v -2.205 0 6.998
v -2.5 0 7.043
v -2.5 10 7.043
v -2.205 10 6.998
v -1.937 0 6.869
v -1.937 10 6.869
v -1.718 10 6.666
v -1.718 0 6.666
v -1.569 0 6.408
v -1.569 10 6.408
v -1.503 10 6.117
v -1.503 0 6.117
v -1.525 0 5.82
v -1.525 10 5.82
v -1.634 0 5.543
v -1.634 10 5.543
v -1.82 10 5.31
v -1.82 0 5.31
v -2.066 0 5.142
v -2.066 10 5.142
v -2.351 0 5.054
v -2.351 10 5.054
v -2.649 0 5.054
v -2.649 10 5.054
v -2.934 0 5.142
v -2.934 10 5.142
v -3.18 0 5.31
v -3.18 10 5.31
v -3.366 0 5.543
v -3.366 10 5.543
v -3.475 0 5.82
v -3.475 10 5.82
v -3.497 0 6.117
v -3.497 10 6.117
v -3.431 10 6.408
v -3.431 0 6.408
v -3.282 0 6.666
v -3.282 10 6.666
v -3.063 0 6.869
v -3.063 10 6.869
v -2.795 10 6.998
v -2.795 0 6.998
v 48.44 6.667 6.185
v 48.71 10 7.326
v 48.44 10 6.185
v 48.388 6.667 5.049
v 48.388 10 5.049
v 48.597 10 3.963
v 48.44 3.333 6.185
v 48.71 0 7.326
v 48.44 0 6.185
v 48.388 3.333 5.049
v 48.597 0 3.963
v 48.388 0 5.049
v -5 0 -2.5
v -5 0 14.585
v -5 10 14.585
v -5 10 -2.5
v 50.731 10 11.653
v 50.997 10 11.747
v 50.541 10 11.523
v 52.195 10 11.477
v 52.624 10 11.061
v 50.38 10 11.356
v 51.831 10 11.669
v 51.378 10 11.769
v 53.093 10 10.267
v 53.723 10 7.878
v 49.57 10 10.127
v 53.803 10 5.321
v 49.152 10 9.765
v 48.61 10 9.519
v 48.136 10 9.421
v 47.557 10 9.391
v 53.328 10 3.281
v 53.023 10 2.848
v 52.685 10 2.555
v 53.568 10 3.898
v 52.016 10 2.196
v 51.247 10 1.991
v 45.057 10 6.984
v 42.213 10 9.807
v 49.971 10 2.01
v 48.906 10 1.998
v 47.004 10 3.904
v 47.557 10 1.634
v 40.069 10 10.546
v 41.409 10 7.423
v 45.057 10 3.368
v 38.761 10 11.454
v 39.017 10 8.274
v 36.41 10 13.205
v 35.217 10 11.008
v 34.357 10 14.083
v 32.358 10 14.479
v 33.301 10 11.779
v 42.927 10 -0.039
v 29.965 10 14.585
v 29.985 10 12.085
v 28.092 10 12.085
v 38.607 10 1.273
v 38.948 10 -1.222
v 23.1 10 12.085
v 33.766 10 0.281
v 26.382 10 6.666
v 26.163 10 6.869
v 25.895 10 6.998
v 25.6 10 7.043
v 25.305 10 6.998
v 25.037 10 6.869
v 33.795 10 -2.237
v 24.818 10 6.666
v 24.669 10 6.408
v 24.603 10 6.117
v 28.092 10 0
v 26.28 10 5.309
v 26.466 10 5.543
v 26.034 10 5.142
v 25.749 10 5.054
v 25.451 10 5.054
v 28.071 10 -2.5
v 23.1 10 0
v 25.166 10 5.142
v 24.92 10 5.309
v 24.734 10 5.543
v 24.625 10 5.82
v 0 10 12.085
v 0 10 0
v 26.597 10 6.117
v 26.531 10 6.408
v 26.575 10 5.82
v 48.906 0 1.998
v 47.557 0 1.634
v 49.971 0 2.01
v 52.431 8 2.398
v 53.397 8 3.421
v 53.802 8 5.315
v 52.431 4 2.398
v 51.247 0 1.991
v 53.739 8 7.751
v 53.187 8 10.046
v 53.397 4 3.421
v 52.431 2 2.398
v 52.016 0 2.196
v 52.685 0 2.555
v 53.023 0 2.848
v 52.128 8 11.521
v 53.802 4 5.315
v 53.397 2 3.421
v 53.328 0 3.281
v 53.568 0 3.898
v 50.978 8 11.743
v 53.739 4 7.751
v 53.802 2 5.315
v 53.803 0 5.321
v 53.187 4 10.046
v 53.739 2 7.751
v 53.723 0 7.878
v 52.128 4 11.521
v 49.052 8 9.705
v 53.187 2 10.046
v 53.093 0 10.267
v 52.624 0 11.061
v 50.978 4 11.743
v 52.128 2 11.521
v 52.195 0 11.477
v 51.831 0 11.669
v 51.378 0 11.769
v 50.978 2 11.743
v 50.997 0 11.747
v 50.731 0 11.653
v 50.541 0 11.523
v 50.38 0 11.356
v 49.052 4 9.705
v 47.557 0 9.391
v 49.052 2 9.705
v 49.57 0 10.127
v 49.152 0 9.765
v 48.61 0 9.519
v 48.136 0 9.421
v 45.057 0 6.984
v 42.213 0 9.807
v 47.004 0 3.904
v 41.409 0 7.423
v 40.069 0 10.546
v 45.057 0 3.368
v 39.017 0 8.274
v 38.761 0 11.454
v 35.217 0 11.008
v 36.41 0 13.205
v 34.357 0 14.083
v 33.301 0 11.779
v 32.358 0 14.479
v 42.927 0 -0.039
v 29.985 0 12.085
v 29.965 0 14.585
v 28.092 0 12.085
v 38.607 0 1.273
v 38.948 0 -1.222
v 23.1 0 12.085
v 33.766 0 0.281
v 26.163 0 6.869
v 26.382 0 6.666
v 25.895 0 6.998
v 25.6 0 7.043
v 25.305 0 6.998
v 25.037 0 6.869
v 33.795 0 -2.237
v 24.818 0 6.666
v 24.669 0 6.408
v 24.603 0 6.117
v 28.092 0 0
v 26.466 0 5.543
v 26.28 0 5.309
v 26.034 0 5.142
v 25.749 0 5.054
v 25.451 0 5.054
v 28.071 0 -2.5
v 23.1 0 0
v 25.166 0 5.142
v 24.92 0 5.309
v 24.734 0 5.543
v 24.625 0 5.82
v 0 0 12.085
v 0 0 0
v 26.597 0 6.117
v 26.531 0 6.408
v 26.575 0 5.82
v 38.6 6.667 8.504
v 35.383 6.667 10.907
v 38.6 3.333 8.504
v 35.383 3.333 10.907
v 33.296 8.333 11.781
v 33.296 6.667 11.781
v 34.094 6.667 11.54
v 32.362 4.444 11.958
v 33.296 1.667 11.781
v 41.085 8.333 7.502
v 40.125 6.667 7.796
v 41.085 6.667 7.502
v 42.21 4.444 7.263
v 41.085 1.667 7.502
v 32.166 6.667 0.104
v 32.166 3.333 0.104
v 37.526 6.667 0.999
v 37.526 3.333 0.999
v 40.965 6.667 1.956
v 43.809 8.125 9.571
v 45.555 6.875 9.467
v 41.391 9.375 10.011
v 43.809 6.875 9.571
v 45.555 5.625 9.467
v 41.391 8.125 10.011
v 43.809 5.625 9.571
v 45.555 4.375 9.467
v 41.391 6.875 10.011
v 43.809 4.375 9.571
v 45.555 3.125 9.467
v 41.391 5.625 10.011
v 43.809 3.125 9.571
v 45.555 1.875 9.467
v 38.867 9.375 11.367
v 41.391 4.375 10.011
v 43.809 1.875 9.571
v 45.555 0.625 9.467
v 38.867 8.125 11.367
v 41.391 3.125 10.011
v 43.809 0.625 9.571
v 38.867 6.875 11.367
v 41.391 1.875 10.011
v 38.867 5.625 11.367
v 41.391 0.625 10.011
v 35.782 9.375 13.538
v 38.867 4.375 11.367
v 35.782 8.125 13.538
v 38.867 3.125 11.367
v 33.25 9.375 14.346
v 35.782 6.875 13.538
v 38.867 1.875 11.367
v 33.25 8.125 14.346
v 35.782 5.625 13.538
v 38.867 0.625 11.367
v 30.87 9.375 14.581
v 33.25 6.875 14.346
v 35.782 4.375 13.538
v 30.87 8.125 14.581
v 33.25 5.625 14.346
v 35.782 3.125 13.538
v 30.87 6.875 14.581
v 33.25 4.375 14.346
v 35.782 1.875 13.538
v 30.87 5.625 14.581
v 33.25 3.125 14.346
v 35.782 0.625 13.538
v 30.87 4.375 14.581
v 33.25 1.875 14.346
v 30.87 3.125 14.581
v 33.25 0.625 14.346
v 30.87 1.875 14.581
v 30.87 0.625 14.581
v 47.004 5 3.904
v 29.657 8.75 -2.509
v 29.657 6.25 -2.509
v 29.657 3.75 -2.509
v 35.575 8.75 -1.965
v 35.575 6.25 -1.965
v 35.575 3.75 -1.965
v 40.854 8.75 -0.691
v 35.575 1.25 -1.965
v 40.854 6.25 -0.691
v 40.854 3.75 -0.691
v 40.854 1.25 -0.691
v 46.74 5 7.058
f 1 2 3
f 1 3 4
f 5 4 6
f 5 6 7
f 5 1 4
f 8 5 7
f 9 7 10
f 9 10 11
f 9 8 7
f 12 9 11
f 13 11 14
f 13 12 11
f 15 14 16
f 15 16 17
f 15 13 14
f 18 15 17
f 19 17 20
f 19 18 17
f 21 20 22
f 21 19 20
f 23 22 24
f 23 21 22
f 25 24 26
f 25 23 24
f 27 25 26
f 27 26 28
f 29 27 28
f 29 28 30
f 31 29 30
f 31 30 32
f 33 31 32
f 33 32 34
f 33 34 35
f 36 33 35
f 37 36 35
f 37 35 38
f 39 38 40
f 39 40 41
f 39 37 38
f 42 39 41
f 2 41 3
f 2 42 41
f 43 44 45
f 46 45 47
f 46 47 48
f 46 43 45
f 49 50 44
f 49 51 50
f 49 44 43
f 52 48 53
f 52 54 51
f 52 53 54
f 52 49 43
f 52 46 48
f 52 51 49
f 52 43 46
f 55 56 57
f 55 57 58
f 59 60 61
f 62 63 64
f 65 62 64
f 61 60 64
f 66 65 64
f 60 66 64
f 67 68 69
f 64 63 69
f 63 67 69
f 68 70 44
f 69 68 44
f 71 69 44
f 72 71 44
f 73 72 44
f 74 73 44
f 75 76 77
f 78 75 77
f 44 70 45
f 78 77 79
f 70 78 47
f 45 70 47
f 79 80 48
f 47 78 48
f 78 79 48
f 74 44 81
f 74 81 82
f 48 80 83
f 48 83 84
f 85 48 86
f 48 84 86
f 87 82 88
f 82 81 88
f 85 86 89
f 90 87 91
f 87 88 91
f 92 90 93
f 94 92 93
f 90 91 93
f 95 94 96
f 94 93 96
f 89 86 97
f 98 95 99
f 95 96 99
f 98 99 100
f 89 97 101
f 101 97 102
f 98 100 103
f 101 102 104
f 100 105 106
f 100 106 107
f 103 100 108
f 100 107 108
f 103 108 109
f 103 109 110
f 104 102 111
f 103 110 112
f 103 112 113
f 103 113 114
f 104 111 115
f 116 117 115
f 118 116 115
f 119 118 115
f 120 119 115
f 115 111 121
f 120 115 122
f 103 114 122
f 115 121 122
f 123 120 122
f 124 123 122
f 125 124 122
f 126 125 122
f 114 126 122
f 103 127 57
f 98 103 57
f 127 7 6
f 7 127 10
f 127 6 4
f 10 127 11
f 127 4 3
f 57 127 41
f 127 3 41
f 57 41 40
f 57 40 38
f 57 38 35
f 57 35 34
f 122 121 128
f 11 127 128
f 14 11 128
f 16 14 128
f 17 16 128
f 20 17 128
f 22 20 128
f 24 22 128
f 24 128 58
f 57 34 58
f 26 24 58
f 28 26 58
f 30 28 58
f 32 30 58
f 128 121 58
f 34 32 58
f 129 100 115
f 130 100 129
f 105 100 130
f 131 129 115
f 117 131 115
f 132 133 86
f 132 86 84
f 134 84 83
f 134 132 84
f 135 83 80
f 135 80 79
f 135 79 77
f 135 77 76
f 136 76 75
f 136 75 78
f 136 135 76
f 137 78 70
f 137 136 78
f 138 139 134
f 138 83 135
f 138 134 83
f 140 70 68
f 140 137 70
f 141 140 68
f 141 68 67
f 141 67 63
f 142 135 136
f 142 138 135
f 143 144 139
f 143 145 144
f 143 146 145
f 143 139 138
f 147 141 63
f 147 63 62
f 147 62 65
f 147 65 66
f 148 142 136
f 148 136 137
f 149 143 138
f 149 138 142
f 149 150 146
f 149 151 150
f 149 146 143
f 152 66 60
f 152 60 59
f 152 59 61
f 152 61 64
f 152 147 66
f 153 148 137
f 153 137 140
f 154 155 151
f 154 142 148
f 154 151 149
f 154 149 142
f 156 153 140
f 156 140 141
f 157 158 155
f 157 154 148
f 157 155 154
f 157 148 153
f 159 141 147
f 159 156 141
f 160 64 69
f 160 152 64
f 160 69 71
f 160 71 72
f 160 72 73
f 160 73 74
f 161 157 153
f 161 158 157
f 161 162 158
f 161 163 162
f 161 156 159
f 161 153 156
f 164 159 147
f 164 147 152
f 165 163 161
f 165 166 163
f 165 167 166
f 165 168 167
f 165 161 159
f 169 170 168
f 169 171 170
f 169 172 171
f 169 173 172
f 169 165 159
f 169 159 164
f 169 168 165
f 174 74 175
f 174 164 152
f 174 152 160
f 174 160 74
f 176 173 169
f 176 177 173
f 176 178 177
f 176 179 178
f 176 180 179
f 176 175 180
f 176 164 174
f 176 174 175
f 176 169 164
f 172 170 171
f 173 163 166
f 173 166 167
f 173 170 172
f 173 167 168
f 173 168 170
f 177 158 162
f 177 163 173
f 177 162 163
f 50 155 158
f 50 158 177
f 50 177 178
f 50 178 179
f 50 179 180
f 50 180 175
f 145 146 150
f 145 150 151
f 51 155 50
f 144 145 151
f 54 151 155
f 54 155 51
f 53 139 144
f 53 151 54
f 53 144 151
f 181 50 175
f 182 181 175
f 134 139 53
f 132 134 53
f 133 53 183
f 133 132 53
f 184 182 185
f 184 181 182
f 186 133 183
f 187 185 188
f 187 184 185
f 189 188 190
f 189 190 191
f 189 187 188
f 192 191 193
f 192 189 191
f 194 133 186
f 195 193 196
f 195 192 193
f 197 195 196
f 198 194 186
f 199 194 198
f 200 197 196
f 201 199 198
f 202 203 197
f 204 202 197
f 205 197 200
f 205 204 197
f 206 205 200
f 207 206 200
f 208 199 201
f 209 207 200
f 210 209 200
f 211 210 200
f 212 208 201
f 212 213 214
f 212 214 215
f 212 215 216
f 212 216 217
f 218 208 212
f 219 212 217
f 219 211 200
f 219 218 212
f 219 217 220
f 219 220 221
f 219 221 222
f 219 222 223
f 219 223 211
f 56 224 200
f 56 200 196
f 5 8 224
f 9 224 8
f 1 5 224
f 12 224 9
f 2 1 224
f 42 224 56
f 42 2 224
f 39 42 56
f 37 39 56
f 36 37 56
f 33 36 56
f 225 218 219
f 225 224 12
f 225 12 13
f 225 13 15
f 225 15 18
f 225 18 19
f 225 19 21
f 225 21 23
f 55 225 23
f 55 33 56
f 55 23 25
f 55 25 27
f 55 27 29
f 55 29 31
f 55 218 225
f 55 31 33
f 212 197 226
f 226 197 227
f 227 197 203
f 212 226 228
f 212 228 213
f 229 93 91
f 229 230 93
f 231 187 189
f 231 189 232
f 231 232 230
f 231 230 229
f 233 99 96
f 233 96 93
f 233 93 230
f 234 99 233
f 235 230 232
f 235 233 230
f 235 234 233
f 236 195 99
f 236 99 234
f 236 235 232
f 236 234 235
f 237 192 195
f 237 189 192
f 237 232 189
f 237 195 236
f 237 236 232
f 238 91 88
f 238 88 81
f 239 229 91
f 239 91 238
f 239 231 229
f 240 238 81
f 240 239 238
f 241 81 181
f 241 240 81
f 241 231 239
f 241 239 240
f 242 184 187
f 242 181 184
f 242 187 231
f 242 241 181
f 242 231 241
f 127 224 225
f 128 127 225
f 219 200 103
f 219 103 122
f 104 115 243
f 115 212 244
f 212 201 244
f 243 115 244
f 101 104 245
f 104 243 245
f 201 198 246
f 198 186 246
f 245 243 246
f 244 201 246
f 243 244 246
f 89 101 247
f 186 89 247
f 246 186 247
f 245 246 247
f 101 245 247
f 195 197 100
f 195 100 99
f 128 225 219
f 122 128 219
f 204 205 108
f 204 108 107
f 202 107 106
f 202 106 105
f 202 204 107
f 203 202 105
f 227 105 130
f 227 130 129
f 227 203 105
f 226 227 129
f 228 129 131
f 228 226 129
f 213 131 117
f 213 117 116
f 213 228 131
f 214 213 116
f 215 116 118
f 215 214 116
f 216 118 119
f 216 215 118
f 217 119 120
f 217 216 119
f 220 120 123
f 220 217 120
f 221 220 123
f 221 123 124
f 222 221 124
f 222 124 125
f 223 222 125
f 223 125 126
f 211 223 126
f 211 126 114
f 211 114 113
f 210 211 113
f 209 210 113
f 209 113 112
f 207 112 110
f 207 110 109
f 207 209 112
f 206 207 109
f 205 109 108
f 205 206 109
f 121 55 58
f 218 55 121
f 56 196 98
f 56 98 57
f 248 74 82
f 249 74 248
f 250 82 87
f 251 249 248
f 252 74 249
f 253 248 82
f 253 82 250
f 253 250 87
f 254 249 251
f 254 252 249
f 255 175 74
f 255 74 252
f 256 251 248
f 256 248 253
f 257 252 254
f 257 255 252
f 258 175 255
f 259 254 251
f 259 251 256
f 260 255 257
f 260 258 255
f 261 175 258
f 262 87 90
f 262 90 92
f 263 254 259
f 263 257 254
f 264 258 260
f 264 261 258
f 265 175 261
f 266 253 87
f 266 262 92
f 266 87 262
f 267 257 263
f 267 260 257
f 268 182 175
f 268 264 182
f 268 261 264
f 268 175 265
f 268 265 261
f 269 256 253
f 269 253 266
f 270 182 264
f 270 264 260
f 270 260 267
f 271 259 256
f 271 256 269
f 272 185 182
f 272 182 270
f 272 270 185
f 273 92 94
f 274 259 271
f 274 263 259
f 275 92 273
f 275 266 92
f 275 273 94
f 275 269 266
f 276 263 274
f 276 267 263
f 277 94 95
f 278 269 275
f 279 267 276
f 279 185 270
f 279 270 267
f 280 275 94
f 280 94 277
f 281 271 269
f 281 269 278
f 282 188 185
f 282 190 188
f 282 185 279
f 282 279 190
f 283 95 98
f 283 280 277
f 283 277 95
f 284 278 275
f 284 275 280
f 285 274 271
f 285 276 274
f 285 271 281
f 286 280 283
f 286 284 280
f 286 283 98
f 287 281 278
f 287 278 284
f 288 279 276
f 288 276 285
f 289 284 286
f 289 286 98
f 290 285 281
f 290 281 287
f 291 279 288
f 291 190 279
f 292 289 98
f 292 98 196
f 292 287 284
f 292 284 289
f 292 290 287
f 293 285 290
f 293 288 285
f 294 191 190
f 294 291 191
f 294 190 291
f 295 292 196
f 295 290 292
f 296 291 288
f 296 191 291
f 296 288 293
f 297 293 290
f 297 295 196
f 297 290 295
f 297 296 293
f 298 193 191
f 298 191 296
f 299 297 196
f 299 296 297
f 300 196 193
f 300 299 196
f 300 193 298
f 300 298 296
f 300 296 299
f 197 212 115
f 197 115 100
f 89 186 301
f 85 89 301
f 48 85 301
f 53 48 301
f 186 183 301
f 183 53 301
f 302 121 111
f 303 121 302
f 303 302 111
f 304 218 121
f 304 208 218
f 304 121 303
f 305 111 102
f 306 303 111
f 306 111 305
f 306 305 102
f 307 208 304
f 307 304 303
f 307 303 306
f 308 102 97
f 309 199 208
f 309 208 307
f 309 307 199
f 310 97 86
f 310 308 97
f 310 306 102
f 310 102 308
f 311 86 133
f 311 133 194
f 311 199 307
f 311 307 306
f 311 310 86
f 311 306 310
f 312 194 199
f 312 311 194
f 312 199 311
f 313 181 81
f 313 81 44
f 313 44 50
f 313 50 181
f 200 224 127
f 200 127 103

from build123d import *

# Parameters (mm, degrees)
SKETCH_1_R      = 1
SKETCH_1_W      = 23.1
SKETCH_1_H      = 12.085165135
EXTRUDE_1_DEPTH = 10


with BuildPart() as part:
    # Эскиз1 → Бобышка-Вытянуть1 (new body)
    with BuildSketch(Plane(origin=(0, 0, 0), x_dir=(1, 0, 0), z_dir=(0, 1, 0))):
        with BuildLine():
            Line((-2.5, 2.5), (28.070995288, 2.5))
            add(Edge.make_bspline(
                [(28.070995288, 2.5), (28.32887344, 2.504318085), (28.835562657, 2.511245965), (29.921866616, 2.512119229), (31.964225284, 2.457517191), (34.707115979, 2.168731474), (37.997362638, 1.485873867), (40.79387565, 0.734966307), (43.953396938, -0.279779406), (46.385663882, -1.195748574), (47.557228164, -1.634125111)],
                knots=[0.143669129, 0.143669129, 0.143669129, 0.143669129, 0.200446635, 0.257224141, 0.370779153, 0.597889176, 0.711444188, 0.824999199, 0.938554211, 1.052109223, 1.052109223, 1.052109223, 1.052109223], degree=3))
            add(Edge.make_bspline(
                [(47.557228164, -1.634125111), (49.83999595, -2.578486337), (50.790555246, -1.175830705), (54.350201844, -3.715245794), (53.810633179, -11.510937101), (49.614910749, -12.021962191), (50.244612096, -9.357273045), (47.557228164, -9.390885833)],
                knots=[0, 0, 0, 0, 0.410599119, 0.487696402, 0.739497672, 0.793875548, 1, 1, 1, 1], degree=3))
            add(Edge.make_bspline(
                [(47.557228164, -9.390885833), (47.223512443, -9.403598686), (46.55537249, -9.42886967), (45.723740105, -9.461231999), (45.050994829, -9.485497305), (44.475367741, -9.514158988), (43.520556703, -9.588873607), (42.395821116, -9.749897974), (40.99972022, -10.09133704), (39.888015817, -10.595512334), (38.900584218, -11.310794918), (37.710783689, -12.364152312), (36.207778756, -13.39563326), (34.630627358, -14.030201283), (33.281126924, -14.37048255), (32.003062284, -14.531692535), (30.884799393, -14.587163413), (30.266883356, -14.58983575), (29.965322631, -14.585165135)],
                knots=[0.000757075, 0.000757075, 0.000757075, 0.000757075, 0.034517651, 0.068278226, 0.085158513, 0.102038801, 0.135799376, 0.203320526, 0.270841676, 0.405883976, 0.540926277, 0.675968577, 0.811010877, 0.878532027, 0.946053178, 1.013574328, 1.047334903, 1.081095478, 1.081095478, 1.081095478, 1.081095478], degree=3))
            Line((29.965322631, -14.585165135), (-2.5, -14.585165135))
            Line((-2.5, -14.585165135), (-5, -14.585165135))
            Line((-5, -14.585165135), (-5, 2.5))
            Line((-5, 2.5), (-2.5, 2.5))
        make_face()
        with Locations(Location((-2.5, -6.042582568, 0), (0, 0, 270))):
            Circle(SKETCH_1_R, mode=Mode.SUBTRACT)
        with Locations(Location((25.600001017, -6.042548927, 0), (0, 0, 270))):
            Circle(SKETCH_1_R, mode=Mode.SUBTRACT)
        with Locations((11.55, -6.042582568)):
            Rectangle(SKETCH_1_W, SKETCH_1_H, mode=Mode.SUBTRACT)
        with BuildLine():
            Line((28.092032276, -12.085165135), (29.985216163, -12.085165135))
            add(Edge.make_bspline(
                [(29.985216163, -12.085165135), (38.281074708, -12.220944361), (35.172452203, -7.360868715), (45.057228164, -6.984309607)],
                knots=[0, 0, 0, 0, 1, 1, 1, 1], degree=3))
            add(Edge.make_bspline(
                [(45.057228164, -6.984309607), (46.59616868, -6.960661023), (48.710327015, -7.325766452)],
                knots=[0, 0, 0, 1, 1, 1], degree=2))
            add(Edge.make_bspline(
                [(48.710327015, -7.325766452), (48.345253613, -6.197571714), (48.243086622, -5.009541806), (48.597312625, -3.963116498)],
                knots=[0, 0, 0, 0, 1, 1, 1, 1], degree=3))
            add(Edge.make_bspline(
                [(45.057228164, -3.367956317), (47.181075152, -4.141830426), (48.597312625, -3.963116498)],
                knots=[0, 0, 0, 1, 1, 1], degree=2))
            add(Edge.make_bspline(
                [(28.092032276, 0), (31.819034224, 0.063049174), (36.14539206, -0.033320809), (45.057228164, -3.367956317)],
                knots=[0.142072164, 0.142072164, 0.142072164, 0.142072164, 1, 1, 1, 1], degree=3))
            Line((28.092032276, 0), (28.092032276, -12.085165135))
        make_face(mode=Mode.SUBTRACT)
    extrude(amount=EXTRUDE_1_DEPTH)


solid = part.part
